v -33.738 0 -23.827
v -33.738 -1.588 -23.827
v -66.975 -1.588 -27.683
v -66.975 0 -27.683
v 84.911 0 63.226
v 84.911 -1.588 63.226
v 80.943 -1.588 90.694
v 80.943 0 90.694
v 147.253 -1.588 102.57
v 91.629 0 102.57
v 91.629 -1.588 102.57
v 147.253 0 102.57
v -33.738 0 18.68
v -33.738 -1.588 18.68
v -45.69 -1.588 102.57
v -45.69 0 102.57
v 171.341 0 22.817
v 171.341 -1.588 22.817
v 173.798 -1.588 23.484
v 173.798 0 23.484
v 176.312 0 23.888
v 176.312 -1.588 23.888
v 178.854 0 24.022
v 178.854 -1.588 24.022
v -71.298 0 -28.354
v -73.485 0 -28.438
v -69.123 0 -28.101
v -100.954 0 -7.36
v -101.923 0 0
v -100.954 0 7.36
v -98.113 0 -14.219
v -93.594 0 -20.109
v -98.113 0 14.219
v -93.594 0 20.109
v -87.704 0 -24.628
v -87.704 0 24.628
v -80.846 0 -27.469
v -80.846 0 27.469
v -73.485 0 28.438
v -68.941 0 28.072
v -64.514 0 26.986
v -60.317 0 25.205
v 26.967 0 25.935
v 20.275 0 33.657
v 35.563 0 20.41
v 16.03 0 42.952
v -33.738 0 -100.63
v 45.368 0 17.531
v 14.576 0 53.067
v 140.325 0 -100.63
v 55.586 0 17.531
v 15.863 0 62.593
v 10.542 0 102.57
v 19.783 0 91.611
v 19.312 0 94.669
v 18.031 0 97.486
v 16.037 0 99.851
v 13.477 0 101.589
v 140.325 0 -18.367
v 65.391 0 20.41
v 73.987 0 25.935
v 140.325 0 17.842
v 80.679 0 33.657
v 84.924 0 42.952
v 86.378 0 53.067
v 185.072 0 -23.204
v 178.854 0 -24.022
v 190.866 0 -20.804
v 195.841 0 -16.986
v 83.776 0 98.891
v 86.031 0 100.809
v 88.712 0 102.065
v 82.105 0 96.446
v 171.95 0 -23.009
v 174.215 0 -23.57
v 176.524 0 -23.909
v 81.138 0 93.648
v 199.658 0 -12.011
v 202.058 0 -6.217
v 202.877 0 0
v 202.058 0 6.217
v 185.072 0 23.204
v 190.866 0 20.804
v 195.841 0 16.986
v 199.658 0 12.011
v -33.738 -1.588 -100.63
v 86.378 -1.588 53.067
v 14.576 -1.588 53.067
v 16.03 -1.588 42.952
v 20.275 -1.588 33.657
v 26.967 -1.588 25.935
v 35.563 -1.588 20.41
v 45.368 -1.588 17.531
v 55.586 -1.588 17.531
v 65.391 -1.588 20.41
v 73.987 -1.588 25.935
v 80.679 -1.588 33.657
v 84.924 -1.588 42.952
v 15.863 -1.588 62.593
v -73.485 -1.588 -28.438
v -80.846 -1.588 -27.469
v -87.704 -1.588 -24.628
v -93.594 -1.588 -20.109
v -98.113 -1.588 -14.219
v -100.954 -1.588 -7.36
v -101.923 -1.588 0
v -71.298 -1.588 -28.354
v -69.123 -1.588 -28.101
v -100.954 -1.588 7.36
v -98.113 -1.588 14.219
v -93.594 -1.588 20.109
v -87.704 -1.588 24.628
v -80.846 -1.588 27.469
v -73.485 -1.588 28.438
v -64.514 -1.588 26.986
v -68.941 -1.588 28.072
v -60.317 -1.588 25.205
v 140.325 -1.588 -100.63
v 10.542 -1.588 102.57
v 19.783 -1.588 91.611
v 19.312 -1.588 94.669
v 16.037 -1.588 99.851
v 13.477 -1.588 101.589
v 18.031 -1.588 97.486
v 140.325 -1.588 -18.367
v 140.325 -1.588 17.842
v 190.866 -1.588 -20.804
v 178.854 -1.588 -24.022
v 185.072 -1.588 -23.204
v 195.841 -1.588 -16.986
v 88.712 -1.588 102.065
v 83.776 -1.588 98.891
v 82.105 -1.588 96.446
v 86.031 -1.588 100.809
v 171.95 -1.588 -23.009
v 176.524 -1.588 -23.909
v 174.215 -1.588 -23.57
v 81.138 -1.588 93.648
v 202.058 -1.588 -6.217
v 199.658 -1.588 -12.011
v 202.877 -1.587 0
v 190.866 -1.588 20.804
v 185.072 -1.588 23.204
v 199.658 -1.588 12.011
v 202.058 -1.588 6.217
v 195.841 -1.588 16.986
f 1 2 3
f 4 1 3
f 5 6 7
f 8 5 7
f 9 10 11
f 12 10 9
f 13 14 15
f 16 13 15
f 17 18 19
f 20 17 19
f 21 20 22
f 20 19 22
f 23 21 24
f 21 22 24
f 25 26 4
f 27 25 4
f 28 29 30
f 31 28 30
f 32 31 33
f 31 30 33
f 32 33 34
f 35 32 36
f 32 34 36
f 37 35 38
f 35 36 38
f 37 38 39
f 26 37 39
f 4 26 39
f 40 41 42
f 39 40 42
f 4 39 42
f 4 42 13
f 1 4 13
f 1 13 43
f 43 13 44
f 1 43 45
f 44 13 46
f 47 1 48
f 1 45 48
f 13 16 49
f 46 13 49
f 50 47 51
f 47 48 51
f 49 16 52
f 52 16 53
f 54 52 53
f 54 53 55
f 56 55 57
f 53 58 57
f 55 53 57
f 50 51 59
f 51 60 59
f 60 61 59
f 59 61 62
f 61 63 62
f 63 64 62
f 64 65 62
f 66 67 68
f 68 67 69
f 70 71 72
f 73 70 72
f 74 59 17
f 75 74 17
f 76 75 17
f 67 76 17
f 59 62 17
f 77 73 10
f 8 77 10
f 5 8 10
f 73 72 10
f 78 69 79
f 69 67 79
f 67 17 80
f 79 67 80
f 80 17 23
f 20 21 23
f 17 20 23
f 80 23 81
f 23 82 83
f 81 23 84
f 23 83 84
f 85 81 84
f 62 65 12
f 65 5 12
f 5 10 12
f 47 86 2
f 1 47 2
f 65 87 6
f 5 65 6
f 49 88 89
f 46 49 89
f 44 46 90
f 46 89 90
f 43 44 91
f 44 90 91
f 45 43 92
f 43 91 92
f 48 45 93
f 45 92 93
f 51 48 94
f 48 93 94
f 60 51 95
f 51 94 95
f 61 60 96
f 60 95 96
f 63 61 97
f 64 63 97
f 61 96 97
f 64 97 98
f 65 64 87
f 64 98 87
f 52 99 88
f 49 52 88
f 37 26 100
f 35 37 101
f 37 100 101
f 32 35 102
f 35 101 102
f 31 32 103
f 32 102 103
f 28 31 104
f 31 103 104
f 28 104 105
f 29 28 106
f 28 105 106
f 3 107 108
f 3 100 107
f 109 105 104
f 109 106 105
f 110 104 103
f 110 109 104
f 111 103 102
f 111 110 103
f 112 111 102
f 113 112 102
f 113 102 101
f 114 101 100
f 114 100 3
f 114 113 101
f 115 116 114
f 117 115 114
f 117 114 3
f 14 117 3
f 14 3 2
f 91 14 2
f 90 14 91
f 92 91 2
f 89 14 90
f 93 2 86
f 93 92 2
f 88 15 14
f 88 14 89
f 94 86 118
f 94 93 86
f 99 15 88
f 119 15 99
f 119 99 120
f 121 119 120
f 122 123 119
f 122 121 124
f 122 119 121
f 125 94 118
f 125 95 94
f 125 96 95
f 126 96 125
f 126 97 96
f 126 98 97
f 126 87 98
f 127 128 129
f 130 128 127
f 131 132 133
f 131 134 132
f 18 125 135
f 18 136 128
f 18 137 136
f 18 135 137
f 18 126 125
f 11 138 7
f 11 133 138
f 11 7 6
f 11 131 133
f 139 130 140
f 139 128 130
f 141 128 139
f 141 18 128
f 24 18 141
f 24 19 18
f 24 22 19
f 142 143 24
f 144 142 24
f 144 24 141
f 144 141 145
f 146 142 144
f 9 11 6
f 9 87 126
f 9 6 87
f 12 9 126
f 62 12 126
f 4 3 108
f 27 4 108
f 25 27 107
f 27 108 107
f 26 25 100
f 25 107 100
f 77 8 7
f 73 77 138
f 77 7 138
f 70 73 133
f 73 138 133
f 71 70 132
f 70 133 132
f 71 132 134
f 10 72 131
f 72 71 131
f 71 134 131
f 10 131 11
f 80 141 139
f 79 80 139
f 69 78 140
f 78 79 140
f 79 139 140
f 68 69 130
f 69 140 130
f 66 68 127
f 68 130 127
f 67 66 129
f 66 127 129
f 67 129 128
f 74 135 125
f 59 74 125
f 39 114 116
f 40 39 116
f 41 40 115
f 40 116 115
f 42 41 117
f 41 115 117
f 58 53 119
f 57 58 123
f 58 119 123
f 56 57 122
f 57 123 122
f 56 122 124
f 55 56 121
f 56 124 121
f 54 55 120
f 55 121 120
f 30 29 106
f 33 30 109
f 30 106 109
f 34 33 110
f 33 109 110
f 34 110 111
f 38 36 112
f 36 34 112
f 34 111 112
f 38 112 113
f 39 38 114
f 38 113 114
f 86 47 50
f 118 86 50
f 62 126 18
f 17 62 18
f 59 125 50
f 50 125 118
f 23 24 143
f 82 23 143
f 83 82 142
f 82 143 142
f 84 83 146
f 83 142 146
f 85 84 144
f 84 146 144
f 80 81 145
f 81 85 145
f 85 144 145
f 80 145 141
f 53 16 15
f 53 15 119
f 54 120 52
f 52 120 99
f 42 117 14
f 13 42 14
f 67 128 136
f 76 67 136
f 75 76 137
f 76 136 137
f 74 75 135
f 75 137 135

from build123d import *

# Parameters (mm, degrees)
F0_W      = 304.8
F0_H      = 203.2
F1_DEPTH  = 1.5875
F3_DEPTH  = 50.8
F5_DEPTH  = 50.8
F7_DEPTH  = 50.8
F9_DEPTH  = 50.8
F10_DEPTH = 50.8
F12_DEPTH = 50.8
F13_DEPTH = 50.8


with BuildPart() as f1:
    # F0 (on Front) → F1 (new body)
    with BuildSketch(Plane.XZ):
        with Locations((50.476827, 0.969891)):
            Rectangle(F0_W, F0_H)
    extrude(amount=F1_DEPTH)

    # F2 (on face) → F3 (cut)
    with BuildSketch(Plane.XZ.offset(1.5875)):
        with BuildLine():
            Line((15.86265, 62.592995), (14.575709, 53.066764))
            ThreePointArc((14.575709, 53.066764), (50.476827, 17.165645), (86.377946, 53.066764))
            Line((86.377946, 53.066764), (84.91056, 63.225917))
            ThreePointArc((84.91056, 63.225917), (50.147756, 88.966374), (15.86265, 62.592995))
        make_face()
        with BuildLine():
            Line((21.263311, 102.569891), (15.86265, 62.592995))
            ThreePointArc((15.86265, 62.592995), (50.147756, 88.966374), (84.91056, 63.225917))
            Line((84.91056, 63.225917), (79.227723, 102.569891))
            Line((79.227723, 102.569891), (21.263311, 102.569891))
        make_face()
    extrude(amount=-F3_DEPTH, mode=Mode.SUBTRACT)

    # F4 (on face) → F5 (cut)
    with BuildSketch(Plane.XZ.offset(1.5875)):
        with BuildLine():
            ThreePointArc((10.542255, 102.569891), (17.11496, 98.736978), (19.782878, 91.611398))
            Line((19.782878, 91.611398), (21.263311, 102.569891))
            Line((21.263311, 102.569891), (10.542255, 102.569891))
        make_face()
    extrude(amount=-F5_DEPTH, mode=Mode.SUBTRACT)

    # F6 (on face) → F7 (cut)
    with BuildSketch(Plane.XZ.offset(1.5875)):
        with BuildLine():
            ThreePointArc((80.943088, 90.693909), (83.775623, 98.891014), (91.629388, 102.569891))
            Line((91.629388, 102.569891), (79.227723, 102.569891))
            Line((79.227723, 102.569891), (80.943088, 90.693909))
        make_face()
    extrude(amount=-F7_DEPTH, mode=Mode.SUBTRACT)

    # F8 (on face) → F9 (cut)
    with BuildSketch(Plane.XZ.offset(1.5875)):
        with BuildLine():
            Line((-33.738296, 18.680416), (-45.690459, 102.569891))
            Line((-45.690459, 102.569891), (-101.923173, 102.569891))
            Line((-101.923173, 102.569891), (-101.923173, 0))
            ThreePointArc((-101.923173, 0), (-93.593919, 20.108597), (-73.485322, 28.43785))
            ThreePointArc((-73.485322, 28.43785), (-66.705464, 27.617836), (-60.316604, 25.205083))
            Line((-60.316604, 25.205083), (-33.738296, 18.680416))
        make_face()
    extrude(amount=-F9_DEPTH, mode=Mode.SUBTRACT)

    # F8 (on face) → F10 (cut)
    with BuildSketch(Plane.XZ.offset(1.5875)):
        with BuildLine():
            Line((-33.738296, -100.630109), (-33.738296, -23.826821))
            Line((-33.738296, -23.826821), (-66.974824, -27.682571))
            ThreePointArc((-66.974824, -27.682571), (-70.208242, -28.2484), (-73.485322, -28.43785))
            ThreePointArc((-73.485322, -28.43785), (-93.593919, -20.108597), (-101.923173, 0))
            Line((-101.923173, 0), (-101.923173, -100.630109))
            Line((-101.923173, -100.630109), (-33.738296, -100.630109))
        make_face()
    extrude(amount=-F10_DEPTH, mode=Mode.SUBTRACT)

    # F11 (on face) → F12 (cut)
    with BuildSketch(Plane.XZ.offset(1.5875)):
        with BuildLine():
            Line((202.876827, 102.569891), (147.253108, 102.569891))
            Line((147.253108, 102.569891), (140.32495, 17.84187))
            Line((140.32495, 17.84187), (171.340779, 22.817166))
            ThreePointArc((171.340779, 22.817166), (175.049557, 23.719205), (178.854391, 24.022436))
            ThreePointArc((178.854391, 24.022436), (195.840819, 16.986428), (202.876827, 0))
            Line((202.876827, 0), (202.876827, 102.569891))
        make_face()
    extrude(amount=-F12_DEPTH, mode=Mode.SUBTRACT)

    # F11 (on face) → F13 (cut)
    with BuildSketch(Plane.XZ.offset(1.5875)):
        with BuildLine():
            Line((171.950437, -23.008974), (140.32495, -18.366525))
            Line((140.32495, -18.366525), (140.32495, -100.630109))
            Line((140.32495, -100.630109), (202.876827, -100.630109))
            Line((202.876827, -100.630109), (202.876827, 0))
            ThreePointArc((202.876827, 0), (195.840819, -16.986428), (178.854391, -24.022436))
            ThreePointArc((178.854391, -24.022436), (175.365419, -23.76772), (171.950437, -23.008974))
        make_face()
    extrude(amount=-F13_DEPTH, mode=Mode.SUBTRACT)


solid = f1.part
